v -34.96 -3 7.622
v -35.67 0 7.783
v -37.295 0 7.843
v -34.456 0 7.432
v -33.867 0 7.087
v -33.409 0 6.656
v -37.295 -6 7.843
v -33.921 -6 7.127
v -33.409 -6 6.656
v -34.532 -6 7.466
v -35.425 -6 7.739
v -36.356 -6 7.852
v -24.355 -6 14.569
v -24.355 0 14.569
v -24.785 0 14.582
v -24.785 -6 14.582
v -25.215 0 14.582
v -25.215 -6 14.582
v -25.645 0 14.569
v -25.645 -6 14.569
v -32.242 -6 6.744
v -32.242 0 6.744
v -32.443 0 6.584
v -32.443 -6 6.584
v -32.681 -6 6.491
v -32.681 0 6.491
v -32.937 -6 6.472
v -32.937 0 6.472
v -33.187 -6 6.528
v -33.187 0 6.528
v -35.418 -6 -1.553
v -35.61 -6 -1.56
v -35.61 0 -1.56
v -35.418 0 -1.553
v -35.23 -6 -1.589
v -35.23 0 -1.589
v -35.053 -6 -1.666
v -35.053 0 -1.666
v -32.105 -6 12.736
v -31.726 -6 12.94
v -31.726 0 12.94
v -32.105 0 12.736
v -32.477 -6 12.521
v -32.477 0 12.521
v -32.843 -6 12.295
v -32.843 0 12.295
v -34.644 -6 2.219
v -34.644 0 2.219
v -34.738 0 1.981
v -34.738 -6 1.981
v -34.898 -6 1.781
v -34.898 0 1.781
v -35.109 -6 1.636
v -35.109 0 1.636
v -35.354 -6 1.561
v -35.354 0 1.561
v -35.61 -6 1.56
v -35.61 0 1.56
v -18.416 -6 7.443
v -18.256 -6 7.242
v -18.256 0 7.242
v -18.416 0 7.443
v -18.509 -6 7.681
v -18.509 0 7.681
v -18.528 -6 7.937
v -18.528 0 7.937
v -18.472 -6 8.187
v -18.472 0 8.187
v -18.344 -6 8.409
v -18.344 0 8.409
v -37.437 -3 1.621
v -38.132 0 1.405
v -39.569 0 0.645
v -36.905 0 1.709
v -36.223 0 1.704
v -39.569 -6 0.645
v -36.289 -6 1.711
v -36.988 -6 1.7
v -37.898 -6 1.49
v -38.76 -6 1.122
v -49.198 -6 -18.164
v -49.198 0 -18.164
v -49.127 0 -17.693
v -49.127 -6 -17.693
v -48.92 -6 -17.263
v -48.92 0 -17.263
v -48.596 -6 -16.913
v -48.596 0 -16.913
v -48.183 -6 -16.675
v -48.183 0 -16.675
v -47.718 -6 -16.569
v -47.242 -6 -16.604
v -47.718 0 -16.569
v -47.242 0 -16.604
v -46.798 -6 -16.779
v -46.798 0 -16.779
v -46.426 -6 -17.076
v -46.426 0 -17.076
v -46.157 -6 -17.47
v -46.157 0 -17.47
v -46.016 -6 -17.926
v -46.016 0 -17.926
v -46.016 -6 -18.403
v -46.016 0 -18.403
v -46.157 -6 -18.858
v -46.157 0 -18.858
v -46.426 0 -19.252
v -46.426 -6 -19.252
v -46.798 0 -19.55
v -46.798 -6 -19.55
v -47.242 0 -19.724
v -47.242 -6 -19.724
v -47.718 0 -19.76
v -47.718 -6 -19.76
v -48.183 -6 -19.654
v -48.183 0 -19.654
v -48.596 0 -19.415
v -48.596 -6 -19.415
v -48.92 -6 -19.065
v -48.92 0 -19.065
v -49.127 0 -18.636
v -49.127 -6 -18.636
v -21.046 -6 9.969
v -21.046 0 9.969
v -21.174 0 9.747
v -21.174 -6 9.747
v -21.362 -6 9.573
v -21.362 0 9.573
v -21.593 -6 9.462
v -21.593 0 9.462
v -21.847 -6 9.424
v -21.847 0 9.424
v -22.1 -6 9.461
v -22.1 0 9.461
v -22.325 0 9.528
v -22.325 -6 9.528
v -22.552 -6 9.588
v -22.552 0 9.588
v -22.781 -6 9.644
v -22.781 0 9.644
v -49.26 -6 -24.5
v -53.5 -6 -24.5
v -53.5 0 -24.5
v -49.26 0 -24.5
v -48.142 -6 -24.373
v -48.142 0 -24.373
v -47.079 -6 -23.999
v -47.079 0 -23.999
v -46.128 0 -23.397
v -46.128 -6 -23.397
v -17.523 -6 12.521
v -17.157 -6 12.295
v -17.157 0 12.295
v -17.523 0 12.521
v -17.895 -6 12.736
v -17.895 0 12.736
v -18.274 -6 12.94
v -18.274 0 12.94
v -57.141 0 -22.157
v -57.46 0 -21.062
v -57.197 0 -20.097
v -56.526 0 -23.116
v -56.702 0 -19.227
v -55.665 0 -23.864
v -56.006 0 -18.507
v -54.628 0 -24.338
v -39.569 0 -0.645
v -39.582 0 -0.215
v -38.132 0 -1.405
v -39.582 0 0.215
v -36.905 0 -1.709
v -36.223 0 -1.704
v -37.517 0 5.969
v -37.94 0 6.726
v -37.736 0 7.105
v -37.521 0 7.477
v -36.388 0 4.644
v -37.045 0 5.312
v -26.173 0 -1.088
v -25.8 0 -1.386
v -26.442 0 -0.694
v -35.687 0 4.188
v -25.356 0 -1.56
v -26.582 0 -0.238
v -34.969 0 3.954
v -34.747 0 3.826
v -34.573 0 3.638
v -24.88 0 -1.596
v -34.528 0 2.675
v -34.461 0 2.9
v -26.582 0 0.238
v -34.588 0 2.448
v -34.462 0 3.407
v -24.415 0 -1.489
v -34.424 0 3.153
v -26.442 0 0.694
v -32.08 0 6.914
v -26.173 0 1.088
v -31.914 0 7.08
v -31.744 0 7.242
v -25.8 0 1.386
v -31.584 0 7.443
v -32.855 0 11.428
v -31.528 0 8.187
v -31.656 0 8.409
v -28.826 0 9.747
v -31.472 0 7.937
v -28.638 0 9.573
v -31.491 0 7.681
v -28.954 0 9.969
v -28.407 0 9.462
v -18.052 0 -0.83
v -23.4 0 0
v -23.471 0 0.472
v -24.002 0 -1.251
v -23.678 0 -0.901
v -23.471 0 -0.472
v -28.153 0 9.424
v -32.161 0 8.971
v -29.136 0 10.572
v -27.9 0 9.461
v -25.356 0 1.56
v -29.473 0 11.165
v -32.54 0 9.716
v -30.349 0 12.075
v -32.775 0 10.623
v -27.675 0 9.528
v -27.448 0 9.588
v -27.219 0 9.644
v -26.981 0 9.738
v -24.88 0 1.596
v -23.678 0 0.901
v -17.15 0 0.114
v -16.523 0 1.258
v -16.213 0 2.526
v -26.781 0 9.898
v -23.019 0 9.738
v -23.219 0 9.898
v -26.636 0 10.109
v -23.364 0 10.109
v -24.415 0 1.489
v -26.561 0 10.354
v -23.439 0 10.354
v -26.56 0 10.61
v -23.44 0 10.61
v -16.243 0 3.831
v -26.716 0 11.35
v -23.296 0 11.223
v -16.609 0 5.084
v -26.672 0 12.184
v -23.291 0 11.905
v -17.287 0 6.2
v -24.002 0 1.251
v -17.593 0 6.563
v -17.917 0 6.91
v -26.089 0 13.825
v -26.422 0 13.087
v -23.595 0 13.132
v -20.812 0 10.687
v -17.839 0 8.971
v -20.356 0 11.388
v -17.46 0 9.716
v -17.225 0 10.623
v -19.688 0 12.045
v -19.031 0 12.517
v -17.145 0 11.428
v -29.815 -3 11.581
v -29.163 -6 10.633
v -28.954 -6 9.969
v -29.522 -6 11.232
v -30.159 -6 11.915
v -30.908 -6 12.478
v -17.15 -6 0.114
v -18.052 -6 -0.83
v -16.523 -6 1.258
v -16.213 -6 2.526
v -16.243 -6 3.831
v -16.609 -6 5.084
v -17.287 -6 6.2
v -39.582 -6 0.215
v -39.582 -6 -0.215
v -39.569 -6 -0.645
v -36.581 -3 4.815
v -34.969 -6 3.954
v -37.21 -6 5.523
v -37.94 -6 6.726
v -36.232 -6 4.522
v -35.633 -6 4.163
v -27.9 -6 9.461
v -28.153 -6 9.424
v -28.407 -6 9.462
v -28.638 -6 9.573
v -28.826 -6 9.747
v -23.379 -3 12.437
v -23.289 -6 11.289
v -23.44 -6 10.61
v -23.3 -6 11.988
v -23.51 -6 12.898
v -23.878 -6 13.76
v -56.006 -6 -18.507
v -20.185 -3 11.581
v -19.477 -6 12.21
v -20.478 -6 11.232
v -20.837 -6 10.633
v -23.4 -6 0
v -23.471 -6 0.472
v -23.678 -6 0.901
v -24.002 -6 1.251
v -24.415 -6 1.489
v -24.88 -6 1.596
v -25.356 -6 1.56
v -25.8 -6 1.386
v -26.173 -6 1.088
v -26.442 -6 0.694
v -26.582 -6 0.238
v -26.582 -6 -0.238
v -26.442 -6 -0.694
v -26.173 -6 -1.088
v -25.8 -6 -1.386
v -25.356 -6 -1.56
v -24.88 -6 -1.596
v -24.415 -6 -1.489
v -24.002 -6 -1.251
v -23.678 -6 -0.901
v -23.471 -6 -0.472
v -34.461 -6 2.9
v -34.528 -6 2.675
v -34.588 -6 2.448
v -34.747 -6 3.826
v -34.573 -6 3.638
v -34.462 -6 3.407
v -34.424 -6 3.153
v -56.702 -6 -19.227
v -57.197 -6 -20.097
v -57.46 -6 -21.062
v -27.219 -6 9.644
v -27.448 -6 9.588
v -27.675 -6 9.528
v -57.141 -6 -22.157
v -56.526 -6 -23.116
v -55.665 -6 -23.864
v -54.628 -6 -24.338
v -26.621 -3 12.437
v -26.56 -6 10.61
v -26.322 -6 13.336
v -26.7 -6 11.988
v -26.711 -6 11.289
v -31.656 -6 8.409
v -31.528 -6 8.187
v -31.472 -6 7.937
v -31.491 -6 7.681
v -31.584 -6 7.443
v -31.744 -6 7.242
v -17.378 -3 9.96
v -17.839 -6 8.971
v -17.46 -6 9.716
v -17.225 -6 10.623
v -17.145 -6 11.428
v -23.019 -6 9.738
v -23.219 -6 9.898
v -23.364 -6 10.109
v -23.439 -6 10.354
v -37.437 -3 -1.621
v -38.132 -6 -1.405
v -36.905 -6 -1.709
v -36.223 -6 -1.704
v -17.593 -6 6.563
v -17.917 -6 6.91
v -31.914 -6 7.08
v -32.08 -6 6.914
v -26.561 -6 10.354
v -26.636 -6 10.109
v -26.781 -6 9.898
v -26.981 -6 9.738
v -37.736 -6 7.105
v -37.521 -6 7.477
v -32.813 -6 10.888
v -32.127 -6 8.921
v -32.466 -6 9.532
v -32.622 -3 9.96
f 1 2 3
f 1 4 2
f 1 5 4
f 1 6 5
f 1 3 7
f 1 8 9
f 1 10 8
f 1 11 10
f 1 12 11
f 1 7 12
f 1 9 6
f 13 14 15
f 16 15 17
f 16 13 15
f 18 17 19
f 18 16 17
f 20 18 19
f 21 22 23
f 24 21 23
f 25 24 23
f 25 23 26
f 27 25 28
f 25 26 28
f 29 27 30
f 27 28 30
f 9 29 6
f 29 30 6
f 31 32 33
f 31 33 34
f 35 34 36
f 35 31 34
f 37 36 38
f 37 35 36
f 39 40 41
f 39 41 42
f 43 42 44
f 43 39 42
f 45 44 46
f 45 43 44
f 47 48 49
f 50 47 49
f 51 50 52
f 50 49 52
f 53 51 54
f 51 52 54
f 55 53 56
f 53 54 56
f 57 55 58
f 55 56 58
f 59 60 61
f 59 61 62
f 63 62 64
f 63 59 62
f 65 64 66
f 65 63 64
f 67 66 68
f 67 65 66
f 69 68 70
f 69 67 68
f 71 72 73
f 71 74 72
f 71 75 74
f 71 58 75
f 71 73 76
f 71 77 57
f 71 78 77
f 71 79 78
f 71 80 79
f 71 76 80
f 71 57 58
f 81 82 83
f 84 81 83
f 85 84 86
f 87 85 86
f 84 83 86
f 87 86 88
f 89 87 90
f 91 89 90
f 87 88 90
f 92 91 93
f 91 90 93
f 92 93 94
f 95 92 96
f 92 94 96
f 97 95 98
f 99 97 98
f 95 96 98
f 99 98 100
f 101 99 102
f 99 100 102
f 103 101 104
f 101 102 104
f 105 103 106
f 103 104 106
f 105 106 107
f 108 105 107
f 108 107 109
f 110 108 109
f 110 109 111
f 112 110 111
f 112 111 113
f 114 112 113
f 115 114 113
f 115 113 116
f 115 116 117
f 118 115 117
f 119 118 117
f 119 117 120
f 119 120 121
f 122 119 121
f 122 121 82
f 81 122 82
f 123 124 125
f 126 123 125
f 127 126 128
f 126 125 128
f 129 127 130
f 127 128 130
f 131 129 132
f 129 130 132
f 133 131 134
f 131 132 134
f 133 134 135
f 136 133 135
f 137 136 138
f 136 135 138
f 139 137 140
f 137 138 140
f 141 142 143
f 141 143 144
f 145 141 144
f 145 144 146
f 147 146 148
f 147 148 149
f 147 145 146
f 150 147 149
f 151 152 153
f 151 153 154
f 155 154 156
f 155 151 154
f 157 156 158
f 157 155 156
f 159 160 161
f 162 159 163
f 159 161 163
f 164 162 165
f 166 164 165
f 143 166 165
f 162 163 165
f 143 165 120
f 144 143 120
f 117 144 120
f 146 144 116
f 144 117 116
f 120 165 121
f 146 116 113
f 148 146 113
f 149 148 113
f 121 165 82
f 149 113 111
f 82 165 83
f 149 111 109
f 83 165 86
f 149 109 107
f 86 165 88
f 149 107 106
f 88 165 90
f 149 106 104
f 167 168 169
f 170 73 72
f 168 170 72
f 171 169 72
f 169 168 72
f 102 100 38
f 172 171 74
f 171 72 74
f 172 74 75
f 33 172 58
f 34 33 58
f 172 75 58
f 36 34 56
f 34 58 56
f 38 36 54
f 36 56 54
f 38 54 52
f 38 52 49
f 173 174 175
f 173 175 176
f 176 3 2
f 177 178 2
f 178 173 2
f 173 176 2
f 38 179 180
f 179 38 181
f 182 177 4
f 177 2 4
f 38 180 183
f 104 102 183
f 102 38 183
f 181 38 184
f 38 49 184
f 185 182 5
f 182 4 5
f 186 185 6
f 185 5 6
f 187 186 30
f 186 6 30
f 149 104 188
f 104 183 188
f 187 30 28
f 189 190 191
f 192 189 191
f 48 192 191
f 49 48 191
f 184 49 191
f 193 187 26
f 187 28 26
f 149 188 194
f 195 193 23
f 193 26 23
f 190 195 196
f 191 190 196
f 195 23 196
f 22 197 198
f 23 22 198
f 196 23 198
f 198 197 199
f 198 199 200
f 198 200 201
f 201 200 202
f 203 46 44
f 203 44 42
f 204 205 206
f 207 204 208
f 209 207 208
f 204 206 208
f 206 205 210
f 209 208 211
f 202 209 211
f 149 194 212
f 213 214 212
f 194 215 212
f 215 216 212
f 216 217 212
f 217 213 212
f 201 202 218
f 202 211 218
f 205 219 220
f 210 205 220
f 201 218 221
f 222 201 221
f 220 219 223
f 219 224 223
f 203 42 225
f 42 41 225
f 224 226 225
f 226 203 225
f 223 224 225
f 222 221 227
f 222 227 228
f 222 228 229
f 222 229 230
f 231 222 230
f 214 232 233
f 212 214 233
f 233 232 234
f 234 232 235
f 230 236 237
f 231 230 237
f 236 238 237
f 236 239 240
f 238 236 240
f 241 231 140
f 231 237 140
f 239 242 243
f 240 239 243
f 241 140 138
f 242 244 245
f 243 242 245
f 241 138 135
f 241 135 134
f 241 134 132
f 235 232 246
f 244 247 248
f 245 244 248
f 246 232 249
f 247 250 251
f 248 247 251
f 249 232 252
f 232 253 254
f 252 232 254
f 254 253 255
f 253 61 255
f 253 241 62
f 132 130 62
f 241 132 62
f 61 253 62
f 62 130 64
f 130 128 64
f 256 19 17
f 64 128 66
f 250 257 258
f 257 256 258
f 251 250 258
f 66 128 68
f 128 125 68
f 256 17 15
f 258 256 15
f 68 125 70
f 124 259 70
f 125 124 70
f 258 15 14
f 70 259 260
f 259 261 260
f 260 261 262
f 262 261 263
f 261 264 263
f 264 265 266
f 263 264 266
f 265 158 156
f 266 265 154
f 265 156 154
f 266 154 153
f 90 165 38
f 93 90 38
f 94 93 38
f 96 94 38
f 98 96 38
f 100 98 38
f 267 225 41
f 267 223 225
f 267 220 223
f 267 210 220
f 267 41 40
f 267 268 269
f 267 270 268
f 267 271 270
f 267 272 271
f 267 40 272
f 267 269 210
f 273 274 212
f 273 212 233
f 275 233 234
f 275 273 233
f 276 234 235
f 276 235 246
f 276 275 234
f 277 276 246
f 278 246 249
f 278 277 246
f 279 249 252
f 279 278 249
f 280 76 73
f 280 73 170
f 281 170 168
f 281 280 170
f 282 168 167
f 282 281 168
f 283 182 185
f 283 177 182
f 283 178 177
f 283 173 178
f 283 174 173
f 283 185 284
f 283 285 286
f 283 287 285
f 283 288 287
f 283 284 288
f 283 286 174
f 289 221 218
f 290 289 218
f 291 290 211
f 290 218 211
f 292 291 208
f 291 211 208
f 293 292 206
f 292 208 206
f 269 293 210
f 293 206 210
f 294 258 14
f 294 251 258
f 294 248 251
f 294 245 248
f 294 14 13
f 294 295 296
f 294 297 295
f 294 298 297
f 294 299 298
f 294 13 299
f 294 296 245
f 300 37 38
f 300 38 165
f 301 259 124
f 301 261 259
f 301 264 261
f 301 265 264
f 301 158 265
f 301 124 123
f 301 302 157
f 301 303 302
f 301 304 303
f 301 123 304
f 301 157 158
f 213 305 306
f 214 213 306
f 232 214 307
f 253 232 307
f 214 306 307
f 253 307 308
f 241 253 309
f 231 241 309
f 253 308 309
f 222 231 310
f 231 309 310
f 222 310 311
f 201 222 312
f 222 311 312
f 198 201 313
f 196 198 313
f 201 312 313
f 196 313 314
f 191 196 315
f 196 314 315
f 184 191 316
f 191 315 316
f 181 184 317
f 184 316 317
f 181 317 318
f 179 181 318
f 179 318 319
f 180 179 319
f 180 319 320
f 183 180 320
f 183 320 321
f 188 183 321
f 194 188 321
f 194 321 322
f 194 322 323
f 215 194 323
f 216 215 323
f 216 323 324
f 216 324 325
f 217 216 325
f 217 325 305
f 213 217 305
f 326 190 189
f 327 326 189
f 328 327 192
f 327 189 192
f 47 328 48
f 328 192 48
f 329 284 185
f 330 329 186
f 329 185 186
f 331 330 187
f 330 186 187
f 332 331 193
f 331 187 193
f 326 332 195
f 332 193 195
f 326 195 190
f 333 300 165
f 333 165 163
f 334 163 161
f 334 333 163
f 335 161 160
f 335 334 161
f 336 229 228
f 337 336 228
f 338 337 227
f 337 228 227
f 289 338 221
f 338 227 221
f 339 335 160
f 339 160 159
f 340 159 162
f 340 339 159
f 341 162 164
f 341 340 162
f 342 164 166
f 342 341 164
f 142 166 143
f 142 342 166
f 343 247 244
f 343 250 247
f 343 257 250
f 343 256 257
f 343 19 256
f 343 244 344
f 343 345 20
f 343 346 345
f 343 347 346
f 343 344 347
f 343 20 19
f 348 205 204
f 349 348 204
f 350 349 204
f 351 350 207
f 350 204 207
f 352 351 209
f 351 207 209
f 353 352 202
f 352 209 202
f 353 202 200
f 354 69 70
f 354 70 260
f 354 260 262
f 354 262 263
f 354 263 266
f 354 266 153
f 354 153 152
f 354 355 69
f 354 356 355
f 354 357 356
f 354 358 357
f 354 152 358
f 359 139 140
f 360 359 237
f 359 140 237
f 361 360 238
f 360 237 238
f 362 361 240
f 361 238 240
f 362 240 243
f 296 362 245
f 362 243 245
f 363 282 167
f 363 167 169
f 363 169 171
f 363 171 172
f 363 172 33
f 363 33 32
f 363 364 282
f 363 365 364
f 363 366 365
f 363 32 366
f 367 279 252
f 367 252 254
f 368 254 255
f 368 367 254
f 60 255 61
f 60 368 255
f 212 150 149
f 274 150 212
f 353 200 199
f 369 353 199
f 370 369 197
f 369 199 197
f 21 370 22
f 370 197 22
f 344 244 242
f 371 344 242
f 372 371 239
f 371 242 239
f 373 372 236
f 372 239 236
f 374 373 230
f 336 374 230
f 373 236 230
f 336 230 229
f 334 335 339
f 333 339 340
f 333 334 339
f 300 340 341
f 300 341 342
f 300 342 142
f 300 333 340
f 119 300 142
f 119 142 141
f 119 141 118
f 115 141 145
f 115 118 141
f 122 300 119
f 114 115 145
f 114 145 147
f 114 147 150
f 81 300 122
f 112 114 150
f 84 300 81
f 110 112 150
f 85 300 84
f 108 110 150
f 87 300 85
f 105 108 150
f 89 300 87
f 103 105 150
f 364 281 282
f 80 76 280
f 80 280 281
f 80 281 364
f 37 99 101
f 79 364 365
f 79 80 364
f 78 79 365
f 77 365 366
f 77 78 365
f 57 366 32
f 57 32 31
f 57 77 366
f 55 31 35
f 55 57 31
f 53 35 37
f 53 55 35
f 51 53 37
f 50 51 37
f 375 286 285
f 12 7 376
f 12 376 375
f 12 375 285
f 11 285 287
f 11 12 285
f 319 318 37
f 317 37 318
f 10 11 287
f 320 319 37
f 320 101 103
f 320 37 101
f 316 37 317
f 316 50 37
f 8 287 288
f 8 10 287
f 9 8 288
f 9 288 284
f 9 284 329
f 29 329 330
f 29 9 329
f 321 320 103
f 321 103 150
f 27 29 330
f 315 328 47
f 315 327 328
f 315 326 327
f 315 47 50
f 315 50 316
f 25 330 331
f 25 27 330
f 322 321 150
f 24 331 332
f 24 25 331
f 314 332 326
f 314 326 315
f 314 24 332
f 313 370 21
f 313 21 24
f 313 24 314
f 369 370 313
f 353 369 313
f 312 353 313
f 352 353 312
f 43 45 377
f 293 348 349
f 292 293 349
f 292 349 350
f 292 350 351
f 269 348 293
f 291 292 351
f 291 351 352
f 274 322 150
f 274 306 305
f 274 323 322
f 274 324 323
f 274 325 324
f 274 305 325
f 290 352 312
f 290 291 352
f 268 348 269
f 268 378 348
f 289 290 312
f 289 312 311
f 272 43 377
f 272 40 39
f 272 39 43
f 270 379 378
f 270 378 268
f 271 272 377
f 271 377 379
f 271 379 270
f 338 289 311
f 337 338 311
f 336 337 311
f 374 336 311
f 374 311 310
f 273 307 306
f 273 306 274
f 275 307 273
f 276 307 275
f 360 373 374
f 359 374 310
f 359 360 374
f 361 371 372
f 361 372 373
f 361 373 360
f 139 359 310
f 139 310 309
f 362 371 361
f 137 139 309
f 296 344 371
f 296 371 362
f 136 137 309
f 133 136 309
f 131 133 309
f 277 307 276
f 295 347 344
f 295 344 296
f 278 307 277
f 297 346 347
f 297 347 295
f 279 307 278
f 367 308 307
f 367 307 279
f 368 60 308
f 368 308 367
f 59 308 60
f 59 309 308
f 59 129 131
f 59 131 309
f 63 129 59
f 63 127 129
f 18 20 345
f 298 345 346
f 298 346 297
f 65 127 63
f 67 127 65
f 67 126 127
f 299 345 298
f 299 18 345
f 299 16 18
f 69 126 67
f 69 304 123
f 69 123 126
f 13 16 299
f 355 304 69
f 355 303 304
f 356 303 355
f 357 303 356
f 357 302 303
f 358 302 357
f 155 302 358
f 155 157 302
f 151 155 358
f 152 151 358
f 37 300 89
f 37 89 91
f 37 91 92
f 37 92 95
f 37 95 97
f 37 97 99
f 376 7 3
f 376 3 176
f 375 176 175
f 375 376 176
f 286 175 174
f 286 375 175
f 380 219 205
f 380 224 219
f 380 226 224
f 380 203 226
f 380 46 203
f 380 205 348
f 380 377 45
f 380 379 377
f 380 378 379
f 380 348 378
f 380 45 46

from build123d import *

# Parameters (mm, degrees)
RESSALTO_EXTRUS_O1_DEPTH = 6
CORTE_EXTRUS_O1_DEPTH    = 7.0000001
CORTE_EXTRUS_O2_DEPTH    = 7.0000001
CORTE_EXTRUS_O3_DEPTH    = 7.0000001
CORTE_EXTRUS_O4_DEPTH    = 7.0000001
ESBO_O6_R                = 1.6
CORTE_EXTRUS_O5_DEPTH    = 7.0000001
ESBO_O7_R                = 1.6
CORTE_EXTRUS_O6_DEPTH    = 7.0000001


with BuildPart() as part:
    # Esboço1 → Ressalto-extrusão1 (new body)
    with BuildSketch(Plane.XZ.offset(6)):
        with BuildLine():
            Line((-35.053391166, -1.665767354), (-56.005959689, -18.507024557))
            ThreePointArc((-56.005959689, -18.507024557), (-56.976417823, -19.646228266), (-57.460270003, -21.062371319))
            ThreePointArc((-57.460270003, -21.062371319), (-56.122071197, -23.520718894), (-53.5, -24.5))
            Line((-53.5, -24.5), (-49.26036734, -24.5))
            ThreePointArc((-49.26036734, -24.5), (-47.599906261, -24.216234622), (-46.127917729, -23.397147602))
            Line((-46.127917729, -23.397147602), (-18.051593362, -0.829957358))
            ThreePointArc((-18.051593362, -0.829957358), (-16.213367114, 2.526467109), (-17.286895371, 6.199639856))
            ThreePointArc((-17.286895371, 6.199639856), (-17.752824847, 6.738395184), (-18.256300836, 7.242239912))
            ThreePointArc((-18.256300836, 7.242239912), (-18.528297677, 7.80831066), (-18.343735303, 8.408606506))
            add(Edge.make_bspline(
                [(-18.343735303, 8.408606506), (-16.98173735, 9.54416389), (-17.156613946, 12.29450716)],
                knots=[0.078549619, 0.078549619, 0.078549619, 0.770539159, 0.770539159, 0.770539159], degree=2, weights=[1, 0.940738559, 1]))
            ThreePointArc((-17.156613946, 12.29450716), (-32.291666667, 12.629537139), (-39.569048555, -0.645317995))
            add(Edge.make_bspline(
                [(-39.569048555, -0.645317995), (-37.274619711, -2.171937204), (-35.610199193, -1.560191069)],
                knots=[2.371053495, 2.371053495, 2.371053495, 3.063043035, 3.063043035, 3.063043035], degree=2, weights=[1, 0.940738559, 1]))
            ThreePointArc((-35.610199193, -1.560191069), (-35.322864942, -1.565881251), (-35.053391166, -1.665767354))
        make_face()
    extrude(amount=-RESSALTO_EXTRUS_O1_DEPTH)

    # Esboço2 → Corte-extrusão1 (cut, through all)
    with BuildSketch(Plane(origin=(0, 0, 0), x_dir=(-1, 0, 0), z_dir=(0, 1, 0))):
        with BuildLine():
            ThreePointArc((24.354682005, 14.569048555), (21.225555592, 14.0864183), (18.274337499, 12.939825155))
            add(Edge.make_bspline(
                [(21.046065504, 9.968797575), (20.743642938, 11.716101094), (18.274337499, 12.939825155)],
                knots=[3.220142273, 3.220142273, 3.220142273, 3.912131812, 3.912131812, 3.912131812], degree=2, weights=[1, 0.940738559, 1]))
            ThreePointArc((21.046065504, 9.968797575), (21.47365577, 9.508813947), (22.099885838, 9.461334748))
            ThreePointArc((22.099885838, 9.461334748), (22.438769866, 9.558640989), (22.780905164, 9.643813326))
            ThreePointArc((22.780905164, 9.643813326), (23.299496712, 9.998046554), (23.439808931, 10.610199193))
            add(Edge.make_bspline(
                [(24.354682005, 14.569048555), (22.828062796, 12.274619711), (23.439808931, 10.610199193)],
                knots=[2.371053495, 2.371053495, 2.371053495, 3.063043035, 3.063043035, 3.063043035], degree=2, weights=[1, 0.940738559, 1]))
        make_face()
    extrude(amount=-CORTE_EXTRUS_O1_DEPTH, mode=Mode.SUBTRACT)

    # Esboço3 → Corte-extrusão2 (cut, through all)
    with BuildSketch(Plane(origin=(0, 0, 0), x_dir=(-1, 0, 0), z_dir=(0, 1, 0))):
        with BuildLine():
            ThreePointArc((31.725662501, 12.939825155), (28.774444408, 14.0864183), (25.645317995, 14.569048555))
            add(Edge.make_bspline(
                [(26.560191069, 10.610199193), (27.171937204, 12.274619711), (25.645317995, 14.569048555)],
                knots=[3.220142273, 3.220142273, 3.220142273, 3.912131812, 3.912131812, 3.912131812], degree=2, weights=[1, 0.940738559, 1]))
            ThreePointArc((26.560191069, 10.610199193), (26.700503288, 9.998046554), (27.219094836, 9.643813326))
            ThreePointArc((27.219094836, 9.643813326), (27.561230134, 9.558640989), (27.900114162, 9.461334748))
            ThreePointArc((27.900114162, 9.461334748), (28.52634423, 9.508813947), (28.953934496, 9.968797575))
            add(Edge.make_bspline(
                [(31.725662501, 12.939825155), (29.256357062, 11.716101094), (28.953934496, 9.968797575)],
                knots=[2.371053495, 2.371053495, 2.371053495, 3.063043035, 3.063043035, 3.063043035], degree=2, weights=[1, 0.940738559, 1]))
        make_face()
    extrude(amount=-CORTE_EXTRUS_O2_DEPTH, mode=Mode.SUBTRACT)

    # Esboço4 → Corte-extrusão3 (cut, through all)
    with BuildSketch(Plane(origin=(0, 0, 0), x_dir=(-1, 0, 0), z_dir=(0, 1, 0))):
        with BuildLine():
            ThreePointArc((37.29450716, 7.843386054), (35.311973892, 10.311973892), (32.843386054, 12.29450716))
            add(Edge.make_bspline(
                [(31.656264697, 8.408606506), (33.01826265, 9.54416389), (32.843386054, 12.29450716)],
                knots=[3.220142273, 3.220142273, 3.220142273, 3.912131812, 3.912131812, 3.912131812], degree=2, weights=[1, 0.940738559, 1]))
            ThreePointArc((31.656264697, 8.408606506), (31.471702323, 7.80831066), (31.743699164, 7.242239912))
            ThreePointArc((31.743699164, 7.242239912), (31.997410855, 6.997410855), (32.242239912, 6.743699164))
            ThreePointArc((32.242239912, 6.743699164), (32.80831066, 6.471702323), (33.408606506, 6.656264697))
            add(Edge.make_bspline(
                [(37.29450716, 7.843386054), (34.54416389, 8.01826265), (33.408606506, 6.656264697)],
                knots=[5.512646149, 5.512646149, 5.512646149, 6.204635688, 6.204635688, 6.204635688], degree=2, weights=[1, 0.940738559, 1]))
        make_face()
    extrude(amount=-CORTE_EXTRUS_O3_DEPTH, mode=Mode.SUBTRACT)

    # Esboço5 → Corte-extrusão4 (cut, through all)
    with BuildSketch(Plane(origin=(0, 0, 0), x_dir=(-1, 0, 0), z_dir=(0, 1, 0))):
        with BuildLine():
            ThreePointArc((39.569048555, 0.645317995), (39.0864183, 3.774444408), (37.939825155, 6.725662501))
            add(Edge.make_bspline(
                [(34.968797575, 3.953934496), (36.716101094, 4.256357062), (37.939825155, 6.725662501)],
                knots=[3.220142273, 3.220142273, 3.220142273, 3.912131812, 3.912131812, 3.912131812], degree=2, weights=[1, 0.940738559, 1]))
            ThreePointArc((34.968797575, 3.953934496), (34.508813947, 3.52634423), (34.461334748, 2.900114162))
            ThreePointArc((34.461334748, 2.900114162), (34.558640989, 2.561230134), (34.643813326, 2.219094836))
            ThreePointArc((34.643813326, 2.219094836), (34.998046554, 1.700503288), (35.610199193, 1.560191069))
            add(Edge.make_bspline(
                [(39.569048555, 0.645317995), (37.274619711, 2.171937204), (35.610199193, 1.560191069)],
                knots=[2.371053495, 2.371053495, 2.371053495, 3.063043035, 3.063043035, 3.063043035], degree=2, weights=[1, 0.940738559, 1]))
        make_face()
    extrude(amount=-CORTE_EXTRUS_O4_DEPTH, mode=Mode.SUBTRACT)

    # Esboço6 → Corte-extrusão5 (cut, through all)
    with BuildSketch(Plane.XZ.offset(6)):
        with Locations((-25, 0)):
            Circle(ESBO_O6_R)
    extrude(amount=-CORTE_EXTRUS_O5_DEPTH, mode=Mode.SUBTRACT)

    # Esboço7 → Corte-extrusão6 (cut, through all)
    with BuildSketch(Plane(origin=(0, 0, 0), x_dir=(-1, 0, 0), z_dir=(0, 1, 0))):
        with Locations((47.598401843, -18.16414524)):
            Circle(ESBO_O7_R)
    extrude(amount=-CORTE_EXTRUS_O6_DEPTH, mode=Mode.SUBTRACT)


solid = part.part
